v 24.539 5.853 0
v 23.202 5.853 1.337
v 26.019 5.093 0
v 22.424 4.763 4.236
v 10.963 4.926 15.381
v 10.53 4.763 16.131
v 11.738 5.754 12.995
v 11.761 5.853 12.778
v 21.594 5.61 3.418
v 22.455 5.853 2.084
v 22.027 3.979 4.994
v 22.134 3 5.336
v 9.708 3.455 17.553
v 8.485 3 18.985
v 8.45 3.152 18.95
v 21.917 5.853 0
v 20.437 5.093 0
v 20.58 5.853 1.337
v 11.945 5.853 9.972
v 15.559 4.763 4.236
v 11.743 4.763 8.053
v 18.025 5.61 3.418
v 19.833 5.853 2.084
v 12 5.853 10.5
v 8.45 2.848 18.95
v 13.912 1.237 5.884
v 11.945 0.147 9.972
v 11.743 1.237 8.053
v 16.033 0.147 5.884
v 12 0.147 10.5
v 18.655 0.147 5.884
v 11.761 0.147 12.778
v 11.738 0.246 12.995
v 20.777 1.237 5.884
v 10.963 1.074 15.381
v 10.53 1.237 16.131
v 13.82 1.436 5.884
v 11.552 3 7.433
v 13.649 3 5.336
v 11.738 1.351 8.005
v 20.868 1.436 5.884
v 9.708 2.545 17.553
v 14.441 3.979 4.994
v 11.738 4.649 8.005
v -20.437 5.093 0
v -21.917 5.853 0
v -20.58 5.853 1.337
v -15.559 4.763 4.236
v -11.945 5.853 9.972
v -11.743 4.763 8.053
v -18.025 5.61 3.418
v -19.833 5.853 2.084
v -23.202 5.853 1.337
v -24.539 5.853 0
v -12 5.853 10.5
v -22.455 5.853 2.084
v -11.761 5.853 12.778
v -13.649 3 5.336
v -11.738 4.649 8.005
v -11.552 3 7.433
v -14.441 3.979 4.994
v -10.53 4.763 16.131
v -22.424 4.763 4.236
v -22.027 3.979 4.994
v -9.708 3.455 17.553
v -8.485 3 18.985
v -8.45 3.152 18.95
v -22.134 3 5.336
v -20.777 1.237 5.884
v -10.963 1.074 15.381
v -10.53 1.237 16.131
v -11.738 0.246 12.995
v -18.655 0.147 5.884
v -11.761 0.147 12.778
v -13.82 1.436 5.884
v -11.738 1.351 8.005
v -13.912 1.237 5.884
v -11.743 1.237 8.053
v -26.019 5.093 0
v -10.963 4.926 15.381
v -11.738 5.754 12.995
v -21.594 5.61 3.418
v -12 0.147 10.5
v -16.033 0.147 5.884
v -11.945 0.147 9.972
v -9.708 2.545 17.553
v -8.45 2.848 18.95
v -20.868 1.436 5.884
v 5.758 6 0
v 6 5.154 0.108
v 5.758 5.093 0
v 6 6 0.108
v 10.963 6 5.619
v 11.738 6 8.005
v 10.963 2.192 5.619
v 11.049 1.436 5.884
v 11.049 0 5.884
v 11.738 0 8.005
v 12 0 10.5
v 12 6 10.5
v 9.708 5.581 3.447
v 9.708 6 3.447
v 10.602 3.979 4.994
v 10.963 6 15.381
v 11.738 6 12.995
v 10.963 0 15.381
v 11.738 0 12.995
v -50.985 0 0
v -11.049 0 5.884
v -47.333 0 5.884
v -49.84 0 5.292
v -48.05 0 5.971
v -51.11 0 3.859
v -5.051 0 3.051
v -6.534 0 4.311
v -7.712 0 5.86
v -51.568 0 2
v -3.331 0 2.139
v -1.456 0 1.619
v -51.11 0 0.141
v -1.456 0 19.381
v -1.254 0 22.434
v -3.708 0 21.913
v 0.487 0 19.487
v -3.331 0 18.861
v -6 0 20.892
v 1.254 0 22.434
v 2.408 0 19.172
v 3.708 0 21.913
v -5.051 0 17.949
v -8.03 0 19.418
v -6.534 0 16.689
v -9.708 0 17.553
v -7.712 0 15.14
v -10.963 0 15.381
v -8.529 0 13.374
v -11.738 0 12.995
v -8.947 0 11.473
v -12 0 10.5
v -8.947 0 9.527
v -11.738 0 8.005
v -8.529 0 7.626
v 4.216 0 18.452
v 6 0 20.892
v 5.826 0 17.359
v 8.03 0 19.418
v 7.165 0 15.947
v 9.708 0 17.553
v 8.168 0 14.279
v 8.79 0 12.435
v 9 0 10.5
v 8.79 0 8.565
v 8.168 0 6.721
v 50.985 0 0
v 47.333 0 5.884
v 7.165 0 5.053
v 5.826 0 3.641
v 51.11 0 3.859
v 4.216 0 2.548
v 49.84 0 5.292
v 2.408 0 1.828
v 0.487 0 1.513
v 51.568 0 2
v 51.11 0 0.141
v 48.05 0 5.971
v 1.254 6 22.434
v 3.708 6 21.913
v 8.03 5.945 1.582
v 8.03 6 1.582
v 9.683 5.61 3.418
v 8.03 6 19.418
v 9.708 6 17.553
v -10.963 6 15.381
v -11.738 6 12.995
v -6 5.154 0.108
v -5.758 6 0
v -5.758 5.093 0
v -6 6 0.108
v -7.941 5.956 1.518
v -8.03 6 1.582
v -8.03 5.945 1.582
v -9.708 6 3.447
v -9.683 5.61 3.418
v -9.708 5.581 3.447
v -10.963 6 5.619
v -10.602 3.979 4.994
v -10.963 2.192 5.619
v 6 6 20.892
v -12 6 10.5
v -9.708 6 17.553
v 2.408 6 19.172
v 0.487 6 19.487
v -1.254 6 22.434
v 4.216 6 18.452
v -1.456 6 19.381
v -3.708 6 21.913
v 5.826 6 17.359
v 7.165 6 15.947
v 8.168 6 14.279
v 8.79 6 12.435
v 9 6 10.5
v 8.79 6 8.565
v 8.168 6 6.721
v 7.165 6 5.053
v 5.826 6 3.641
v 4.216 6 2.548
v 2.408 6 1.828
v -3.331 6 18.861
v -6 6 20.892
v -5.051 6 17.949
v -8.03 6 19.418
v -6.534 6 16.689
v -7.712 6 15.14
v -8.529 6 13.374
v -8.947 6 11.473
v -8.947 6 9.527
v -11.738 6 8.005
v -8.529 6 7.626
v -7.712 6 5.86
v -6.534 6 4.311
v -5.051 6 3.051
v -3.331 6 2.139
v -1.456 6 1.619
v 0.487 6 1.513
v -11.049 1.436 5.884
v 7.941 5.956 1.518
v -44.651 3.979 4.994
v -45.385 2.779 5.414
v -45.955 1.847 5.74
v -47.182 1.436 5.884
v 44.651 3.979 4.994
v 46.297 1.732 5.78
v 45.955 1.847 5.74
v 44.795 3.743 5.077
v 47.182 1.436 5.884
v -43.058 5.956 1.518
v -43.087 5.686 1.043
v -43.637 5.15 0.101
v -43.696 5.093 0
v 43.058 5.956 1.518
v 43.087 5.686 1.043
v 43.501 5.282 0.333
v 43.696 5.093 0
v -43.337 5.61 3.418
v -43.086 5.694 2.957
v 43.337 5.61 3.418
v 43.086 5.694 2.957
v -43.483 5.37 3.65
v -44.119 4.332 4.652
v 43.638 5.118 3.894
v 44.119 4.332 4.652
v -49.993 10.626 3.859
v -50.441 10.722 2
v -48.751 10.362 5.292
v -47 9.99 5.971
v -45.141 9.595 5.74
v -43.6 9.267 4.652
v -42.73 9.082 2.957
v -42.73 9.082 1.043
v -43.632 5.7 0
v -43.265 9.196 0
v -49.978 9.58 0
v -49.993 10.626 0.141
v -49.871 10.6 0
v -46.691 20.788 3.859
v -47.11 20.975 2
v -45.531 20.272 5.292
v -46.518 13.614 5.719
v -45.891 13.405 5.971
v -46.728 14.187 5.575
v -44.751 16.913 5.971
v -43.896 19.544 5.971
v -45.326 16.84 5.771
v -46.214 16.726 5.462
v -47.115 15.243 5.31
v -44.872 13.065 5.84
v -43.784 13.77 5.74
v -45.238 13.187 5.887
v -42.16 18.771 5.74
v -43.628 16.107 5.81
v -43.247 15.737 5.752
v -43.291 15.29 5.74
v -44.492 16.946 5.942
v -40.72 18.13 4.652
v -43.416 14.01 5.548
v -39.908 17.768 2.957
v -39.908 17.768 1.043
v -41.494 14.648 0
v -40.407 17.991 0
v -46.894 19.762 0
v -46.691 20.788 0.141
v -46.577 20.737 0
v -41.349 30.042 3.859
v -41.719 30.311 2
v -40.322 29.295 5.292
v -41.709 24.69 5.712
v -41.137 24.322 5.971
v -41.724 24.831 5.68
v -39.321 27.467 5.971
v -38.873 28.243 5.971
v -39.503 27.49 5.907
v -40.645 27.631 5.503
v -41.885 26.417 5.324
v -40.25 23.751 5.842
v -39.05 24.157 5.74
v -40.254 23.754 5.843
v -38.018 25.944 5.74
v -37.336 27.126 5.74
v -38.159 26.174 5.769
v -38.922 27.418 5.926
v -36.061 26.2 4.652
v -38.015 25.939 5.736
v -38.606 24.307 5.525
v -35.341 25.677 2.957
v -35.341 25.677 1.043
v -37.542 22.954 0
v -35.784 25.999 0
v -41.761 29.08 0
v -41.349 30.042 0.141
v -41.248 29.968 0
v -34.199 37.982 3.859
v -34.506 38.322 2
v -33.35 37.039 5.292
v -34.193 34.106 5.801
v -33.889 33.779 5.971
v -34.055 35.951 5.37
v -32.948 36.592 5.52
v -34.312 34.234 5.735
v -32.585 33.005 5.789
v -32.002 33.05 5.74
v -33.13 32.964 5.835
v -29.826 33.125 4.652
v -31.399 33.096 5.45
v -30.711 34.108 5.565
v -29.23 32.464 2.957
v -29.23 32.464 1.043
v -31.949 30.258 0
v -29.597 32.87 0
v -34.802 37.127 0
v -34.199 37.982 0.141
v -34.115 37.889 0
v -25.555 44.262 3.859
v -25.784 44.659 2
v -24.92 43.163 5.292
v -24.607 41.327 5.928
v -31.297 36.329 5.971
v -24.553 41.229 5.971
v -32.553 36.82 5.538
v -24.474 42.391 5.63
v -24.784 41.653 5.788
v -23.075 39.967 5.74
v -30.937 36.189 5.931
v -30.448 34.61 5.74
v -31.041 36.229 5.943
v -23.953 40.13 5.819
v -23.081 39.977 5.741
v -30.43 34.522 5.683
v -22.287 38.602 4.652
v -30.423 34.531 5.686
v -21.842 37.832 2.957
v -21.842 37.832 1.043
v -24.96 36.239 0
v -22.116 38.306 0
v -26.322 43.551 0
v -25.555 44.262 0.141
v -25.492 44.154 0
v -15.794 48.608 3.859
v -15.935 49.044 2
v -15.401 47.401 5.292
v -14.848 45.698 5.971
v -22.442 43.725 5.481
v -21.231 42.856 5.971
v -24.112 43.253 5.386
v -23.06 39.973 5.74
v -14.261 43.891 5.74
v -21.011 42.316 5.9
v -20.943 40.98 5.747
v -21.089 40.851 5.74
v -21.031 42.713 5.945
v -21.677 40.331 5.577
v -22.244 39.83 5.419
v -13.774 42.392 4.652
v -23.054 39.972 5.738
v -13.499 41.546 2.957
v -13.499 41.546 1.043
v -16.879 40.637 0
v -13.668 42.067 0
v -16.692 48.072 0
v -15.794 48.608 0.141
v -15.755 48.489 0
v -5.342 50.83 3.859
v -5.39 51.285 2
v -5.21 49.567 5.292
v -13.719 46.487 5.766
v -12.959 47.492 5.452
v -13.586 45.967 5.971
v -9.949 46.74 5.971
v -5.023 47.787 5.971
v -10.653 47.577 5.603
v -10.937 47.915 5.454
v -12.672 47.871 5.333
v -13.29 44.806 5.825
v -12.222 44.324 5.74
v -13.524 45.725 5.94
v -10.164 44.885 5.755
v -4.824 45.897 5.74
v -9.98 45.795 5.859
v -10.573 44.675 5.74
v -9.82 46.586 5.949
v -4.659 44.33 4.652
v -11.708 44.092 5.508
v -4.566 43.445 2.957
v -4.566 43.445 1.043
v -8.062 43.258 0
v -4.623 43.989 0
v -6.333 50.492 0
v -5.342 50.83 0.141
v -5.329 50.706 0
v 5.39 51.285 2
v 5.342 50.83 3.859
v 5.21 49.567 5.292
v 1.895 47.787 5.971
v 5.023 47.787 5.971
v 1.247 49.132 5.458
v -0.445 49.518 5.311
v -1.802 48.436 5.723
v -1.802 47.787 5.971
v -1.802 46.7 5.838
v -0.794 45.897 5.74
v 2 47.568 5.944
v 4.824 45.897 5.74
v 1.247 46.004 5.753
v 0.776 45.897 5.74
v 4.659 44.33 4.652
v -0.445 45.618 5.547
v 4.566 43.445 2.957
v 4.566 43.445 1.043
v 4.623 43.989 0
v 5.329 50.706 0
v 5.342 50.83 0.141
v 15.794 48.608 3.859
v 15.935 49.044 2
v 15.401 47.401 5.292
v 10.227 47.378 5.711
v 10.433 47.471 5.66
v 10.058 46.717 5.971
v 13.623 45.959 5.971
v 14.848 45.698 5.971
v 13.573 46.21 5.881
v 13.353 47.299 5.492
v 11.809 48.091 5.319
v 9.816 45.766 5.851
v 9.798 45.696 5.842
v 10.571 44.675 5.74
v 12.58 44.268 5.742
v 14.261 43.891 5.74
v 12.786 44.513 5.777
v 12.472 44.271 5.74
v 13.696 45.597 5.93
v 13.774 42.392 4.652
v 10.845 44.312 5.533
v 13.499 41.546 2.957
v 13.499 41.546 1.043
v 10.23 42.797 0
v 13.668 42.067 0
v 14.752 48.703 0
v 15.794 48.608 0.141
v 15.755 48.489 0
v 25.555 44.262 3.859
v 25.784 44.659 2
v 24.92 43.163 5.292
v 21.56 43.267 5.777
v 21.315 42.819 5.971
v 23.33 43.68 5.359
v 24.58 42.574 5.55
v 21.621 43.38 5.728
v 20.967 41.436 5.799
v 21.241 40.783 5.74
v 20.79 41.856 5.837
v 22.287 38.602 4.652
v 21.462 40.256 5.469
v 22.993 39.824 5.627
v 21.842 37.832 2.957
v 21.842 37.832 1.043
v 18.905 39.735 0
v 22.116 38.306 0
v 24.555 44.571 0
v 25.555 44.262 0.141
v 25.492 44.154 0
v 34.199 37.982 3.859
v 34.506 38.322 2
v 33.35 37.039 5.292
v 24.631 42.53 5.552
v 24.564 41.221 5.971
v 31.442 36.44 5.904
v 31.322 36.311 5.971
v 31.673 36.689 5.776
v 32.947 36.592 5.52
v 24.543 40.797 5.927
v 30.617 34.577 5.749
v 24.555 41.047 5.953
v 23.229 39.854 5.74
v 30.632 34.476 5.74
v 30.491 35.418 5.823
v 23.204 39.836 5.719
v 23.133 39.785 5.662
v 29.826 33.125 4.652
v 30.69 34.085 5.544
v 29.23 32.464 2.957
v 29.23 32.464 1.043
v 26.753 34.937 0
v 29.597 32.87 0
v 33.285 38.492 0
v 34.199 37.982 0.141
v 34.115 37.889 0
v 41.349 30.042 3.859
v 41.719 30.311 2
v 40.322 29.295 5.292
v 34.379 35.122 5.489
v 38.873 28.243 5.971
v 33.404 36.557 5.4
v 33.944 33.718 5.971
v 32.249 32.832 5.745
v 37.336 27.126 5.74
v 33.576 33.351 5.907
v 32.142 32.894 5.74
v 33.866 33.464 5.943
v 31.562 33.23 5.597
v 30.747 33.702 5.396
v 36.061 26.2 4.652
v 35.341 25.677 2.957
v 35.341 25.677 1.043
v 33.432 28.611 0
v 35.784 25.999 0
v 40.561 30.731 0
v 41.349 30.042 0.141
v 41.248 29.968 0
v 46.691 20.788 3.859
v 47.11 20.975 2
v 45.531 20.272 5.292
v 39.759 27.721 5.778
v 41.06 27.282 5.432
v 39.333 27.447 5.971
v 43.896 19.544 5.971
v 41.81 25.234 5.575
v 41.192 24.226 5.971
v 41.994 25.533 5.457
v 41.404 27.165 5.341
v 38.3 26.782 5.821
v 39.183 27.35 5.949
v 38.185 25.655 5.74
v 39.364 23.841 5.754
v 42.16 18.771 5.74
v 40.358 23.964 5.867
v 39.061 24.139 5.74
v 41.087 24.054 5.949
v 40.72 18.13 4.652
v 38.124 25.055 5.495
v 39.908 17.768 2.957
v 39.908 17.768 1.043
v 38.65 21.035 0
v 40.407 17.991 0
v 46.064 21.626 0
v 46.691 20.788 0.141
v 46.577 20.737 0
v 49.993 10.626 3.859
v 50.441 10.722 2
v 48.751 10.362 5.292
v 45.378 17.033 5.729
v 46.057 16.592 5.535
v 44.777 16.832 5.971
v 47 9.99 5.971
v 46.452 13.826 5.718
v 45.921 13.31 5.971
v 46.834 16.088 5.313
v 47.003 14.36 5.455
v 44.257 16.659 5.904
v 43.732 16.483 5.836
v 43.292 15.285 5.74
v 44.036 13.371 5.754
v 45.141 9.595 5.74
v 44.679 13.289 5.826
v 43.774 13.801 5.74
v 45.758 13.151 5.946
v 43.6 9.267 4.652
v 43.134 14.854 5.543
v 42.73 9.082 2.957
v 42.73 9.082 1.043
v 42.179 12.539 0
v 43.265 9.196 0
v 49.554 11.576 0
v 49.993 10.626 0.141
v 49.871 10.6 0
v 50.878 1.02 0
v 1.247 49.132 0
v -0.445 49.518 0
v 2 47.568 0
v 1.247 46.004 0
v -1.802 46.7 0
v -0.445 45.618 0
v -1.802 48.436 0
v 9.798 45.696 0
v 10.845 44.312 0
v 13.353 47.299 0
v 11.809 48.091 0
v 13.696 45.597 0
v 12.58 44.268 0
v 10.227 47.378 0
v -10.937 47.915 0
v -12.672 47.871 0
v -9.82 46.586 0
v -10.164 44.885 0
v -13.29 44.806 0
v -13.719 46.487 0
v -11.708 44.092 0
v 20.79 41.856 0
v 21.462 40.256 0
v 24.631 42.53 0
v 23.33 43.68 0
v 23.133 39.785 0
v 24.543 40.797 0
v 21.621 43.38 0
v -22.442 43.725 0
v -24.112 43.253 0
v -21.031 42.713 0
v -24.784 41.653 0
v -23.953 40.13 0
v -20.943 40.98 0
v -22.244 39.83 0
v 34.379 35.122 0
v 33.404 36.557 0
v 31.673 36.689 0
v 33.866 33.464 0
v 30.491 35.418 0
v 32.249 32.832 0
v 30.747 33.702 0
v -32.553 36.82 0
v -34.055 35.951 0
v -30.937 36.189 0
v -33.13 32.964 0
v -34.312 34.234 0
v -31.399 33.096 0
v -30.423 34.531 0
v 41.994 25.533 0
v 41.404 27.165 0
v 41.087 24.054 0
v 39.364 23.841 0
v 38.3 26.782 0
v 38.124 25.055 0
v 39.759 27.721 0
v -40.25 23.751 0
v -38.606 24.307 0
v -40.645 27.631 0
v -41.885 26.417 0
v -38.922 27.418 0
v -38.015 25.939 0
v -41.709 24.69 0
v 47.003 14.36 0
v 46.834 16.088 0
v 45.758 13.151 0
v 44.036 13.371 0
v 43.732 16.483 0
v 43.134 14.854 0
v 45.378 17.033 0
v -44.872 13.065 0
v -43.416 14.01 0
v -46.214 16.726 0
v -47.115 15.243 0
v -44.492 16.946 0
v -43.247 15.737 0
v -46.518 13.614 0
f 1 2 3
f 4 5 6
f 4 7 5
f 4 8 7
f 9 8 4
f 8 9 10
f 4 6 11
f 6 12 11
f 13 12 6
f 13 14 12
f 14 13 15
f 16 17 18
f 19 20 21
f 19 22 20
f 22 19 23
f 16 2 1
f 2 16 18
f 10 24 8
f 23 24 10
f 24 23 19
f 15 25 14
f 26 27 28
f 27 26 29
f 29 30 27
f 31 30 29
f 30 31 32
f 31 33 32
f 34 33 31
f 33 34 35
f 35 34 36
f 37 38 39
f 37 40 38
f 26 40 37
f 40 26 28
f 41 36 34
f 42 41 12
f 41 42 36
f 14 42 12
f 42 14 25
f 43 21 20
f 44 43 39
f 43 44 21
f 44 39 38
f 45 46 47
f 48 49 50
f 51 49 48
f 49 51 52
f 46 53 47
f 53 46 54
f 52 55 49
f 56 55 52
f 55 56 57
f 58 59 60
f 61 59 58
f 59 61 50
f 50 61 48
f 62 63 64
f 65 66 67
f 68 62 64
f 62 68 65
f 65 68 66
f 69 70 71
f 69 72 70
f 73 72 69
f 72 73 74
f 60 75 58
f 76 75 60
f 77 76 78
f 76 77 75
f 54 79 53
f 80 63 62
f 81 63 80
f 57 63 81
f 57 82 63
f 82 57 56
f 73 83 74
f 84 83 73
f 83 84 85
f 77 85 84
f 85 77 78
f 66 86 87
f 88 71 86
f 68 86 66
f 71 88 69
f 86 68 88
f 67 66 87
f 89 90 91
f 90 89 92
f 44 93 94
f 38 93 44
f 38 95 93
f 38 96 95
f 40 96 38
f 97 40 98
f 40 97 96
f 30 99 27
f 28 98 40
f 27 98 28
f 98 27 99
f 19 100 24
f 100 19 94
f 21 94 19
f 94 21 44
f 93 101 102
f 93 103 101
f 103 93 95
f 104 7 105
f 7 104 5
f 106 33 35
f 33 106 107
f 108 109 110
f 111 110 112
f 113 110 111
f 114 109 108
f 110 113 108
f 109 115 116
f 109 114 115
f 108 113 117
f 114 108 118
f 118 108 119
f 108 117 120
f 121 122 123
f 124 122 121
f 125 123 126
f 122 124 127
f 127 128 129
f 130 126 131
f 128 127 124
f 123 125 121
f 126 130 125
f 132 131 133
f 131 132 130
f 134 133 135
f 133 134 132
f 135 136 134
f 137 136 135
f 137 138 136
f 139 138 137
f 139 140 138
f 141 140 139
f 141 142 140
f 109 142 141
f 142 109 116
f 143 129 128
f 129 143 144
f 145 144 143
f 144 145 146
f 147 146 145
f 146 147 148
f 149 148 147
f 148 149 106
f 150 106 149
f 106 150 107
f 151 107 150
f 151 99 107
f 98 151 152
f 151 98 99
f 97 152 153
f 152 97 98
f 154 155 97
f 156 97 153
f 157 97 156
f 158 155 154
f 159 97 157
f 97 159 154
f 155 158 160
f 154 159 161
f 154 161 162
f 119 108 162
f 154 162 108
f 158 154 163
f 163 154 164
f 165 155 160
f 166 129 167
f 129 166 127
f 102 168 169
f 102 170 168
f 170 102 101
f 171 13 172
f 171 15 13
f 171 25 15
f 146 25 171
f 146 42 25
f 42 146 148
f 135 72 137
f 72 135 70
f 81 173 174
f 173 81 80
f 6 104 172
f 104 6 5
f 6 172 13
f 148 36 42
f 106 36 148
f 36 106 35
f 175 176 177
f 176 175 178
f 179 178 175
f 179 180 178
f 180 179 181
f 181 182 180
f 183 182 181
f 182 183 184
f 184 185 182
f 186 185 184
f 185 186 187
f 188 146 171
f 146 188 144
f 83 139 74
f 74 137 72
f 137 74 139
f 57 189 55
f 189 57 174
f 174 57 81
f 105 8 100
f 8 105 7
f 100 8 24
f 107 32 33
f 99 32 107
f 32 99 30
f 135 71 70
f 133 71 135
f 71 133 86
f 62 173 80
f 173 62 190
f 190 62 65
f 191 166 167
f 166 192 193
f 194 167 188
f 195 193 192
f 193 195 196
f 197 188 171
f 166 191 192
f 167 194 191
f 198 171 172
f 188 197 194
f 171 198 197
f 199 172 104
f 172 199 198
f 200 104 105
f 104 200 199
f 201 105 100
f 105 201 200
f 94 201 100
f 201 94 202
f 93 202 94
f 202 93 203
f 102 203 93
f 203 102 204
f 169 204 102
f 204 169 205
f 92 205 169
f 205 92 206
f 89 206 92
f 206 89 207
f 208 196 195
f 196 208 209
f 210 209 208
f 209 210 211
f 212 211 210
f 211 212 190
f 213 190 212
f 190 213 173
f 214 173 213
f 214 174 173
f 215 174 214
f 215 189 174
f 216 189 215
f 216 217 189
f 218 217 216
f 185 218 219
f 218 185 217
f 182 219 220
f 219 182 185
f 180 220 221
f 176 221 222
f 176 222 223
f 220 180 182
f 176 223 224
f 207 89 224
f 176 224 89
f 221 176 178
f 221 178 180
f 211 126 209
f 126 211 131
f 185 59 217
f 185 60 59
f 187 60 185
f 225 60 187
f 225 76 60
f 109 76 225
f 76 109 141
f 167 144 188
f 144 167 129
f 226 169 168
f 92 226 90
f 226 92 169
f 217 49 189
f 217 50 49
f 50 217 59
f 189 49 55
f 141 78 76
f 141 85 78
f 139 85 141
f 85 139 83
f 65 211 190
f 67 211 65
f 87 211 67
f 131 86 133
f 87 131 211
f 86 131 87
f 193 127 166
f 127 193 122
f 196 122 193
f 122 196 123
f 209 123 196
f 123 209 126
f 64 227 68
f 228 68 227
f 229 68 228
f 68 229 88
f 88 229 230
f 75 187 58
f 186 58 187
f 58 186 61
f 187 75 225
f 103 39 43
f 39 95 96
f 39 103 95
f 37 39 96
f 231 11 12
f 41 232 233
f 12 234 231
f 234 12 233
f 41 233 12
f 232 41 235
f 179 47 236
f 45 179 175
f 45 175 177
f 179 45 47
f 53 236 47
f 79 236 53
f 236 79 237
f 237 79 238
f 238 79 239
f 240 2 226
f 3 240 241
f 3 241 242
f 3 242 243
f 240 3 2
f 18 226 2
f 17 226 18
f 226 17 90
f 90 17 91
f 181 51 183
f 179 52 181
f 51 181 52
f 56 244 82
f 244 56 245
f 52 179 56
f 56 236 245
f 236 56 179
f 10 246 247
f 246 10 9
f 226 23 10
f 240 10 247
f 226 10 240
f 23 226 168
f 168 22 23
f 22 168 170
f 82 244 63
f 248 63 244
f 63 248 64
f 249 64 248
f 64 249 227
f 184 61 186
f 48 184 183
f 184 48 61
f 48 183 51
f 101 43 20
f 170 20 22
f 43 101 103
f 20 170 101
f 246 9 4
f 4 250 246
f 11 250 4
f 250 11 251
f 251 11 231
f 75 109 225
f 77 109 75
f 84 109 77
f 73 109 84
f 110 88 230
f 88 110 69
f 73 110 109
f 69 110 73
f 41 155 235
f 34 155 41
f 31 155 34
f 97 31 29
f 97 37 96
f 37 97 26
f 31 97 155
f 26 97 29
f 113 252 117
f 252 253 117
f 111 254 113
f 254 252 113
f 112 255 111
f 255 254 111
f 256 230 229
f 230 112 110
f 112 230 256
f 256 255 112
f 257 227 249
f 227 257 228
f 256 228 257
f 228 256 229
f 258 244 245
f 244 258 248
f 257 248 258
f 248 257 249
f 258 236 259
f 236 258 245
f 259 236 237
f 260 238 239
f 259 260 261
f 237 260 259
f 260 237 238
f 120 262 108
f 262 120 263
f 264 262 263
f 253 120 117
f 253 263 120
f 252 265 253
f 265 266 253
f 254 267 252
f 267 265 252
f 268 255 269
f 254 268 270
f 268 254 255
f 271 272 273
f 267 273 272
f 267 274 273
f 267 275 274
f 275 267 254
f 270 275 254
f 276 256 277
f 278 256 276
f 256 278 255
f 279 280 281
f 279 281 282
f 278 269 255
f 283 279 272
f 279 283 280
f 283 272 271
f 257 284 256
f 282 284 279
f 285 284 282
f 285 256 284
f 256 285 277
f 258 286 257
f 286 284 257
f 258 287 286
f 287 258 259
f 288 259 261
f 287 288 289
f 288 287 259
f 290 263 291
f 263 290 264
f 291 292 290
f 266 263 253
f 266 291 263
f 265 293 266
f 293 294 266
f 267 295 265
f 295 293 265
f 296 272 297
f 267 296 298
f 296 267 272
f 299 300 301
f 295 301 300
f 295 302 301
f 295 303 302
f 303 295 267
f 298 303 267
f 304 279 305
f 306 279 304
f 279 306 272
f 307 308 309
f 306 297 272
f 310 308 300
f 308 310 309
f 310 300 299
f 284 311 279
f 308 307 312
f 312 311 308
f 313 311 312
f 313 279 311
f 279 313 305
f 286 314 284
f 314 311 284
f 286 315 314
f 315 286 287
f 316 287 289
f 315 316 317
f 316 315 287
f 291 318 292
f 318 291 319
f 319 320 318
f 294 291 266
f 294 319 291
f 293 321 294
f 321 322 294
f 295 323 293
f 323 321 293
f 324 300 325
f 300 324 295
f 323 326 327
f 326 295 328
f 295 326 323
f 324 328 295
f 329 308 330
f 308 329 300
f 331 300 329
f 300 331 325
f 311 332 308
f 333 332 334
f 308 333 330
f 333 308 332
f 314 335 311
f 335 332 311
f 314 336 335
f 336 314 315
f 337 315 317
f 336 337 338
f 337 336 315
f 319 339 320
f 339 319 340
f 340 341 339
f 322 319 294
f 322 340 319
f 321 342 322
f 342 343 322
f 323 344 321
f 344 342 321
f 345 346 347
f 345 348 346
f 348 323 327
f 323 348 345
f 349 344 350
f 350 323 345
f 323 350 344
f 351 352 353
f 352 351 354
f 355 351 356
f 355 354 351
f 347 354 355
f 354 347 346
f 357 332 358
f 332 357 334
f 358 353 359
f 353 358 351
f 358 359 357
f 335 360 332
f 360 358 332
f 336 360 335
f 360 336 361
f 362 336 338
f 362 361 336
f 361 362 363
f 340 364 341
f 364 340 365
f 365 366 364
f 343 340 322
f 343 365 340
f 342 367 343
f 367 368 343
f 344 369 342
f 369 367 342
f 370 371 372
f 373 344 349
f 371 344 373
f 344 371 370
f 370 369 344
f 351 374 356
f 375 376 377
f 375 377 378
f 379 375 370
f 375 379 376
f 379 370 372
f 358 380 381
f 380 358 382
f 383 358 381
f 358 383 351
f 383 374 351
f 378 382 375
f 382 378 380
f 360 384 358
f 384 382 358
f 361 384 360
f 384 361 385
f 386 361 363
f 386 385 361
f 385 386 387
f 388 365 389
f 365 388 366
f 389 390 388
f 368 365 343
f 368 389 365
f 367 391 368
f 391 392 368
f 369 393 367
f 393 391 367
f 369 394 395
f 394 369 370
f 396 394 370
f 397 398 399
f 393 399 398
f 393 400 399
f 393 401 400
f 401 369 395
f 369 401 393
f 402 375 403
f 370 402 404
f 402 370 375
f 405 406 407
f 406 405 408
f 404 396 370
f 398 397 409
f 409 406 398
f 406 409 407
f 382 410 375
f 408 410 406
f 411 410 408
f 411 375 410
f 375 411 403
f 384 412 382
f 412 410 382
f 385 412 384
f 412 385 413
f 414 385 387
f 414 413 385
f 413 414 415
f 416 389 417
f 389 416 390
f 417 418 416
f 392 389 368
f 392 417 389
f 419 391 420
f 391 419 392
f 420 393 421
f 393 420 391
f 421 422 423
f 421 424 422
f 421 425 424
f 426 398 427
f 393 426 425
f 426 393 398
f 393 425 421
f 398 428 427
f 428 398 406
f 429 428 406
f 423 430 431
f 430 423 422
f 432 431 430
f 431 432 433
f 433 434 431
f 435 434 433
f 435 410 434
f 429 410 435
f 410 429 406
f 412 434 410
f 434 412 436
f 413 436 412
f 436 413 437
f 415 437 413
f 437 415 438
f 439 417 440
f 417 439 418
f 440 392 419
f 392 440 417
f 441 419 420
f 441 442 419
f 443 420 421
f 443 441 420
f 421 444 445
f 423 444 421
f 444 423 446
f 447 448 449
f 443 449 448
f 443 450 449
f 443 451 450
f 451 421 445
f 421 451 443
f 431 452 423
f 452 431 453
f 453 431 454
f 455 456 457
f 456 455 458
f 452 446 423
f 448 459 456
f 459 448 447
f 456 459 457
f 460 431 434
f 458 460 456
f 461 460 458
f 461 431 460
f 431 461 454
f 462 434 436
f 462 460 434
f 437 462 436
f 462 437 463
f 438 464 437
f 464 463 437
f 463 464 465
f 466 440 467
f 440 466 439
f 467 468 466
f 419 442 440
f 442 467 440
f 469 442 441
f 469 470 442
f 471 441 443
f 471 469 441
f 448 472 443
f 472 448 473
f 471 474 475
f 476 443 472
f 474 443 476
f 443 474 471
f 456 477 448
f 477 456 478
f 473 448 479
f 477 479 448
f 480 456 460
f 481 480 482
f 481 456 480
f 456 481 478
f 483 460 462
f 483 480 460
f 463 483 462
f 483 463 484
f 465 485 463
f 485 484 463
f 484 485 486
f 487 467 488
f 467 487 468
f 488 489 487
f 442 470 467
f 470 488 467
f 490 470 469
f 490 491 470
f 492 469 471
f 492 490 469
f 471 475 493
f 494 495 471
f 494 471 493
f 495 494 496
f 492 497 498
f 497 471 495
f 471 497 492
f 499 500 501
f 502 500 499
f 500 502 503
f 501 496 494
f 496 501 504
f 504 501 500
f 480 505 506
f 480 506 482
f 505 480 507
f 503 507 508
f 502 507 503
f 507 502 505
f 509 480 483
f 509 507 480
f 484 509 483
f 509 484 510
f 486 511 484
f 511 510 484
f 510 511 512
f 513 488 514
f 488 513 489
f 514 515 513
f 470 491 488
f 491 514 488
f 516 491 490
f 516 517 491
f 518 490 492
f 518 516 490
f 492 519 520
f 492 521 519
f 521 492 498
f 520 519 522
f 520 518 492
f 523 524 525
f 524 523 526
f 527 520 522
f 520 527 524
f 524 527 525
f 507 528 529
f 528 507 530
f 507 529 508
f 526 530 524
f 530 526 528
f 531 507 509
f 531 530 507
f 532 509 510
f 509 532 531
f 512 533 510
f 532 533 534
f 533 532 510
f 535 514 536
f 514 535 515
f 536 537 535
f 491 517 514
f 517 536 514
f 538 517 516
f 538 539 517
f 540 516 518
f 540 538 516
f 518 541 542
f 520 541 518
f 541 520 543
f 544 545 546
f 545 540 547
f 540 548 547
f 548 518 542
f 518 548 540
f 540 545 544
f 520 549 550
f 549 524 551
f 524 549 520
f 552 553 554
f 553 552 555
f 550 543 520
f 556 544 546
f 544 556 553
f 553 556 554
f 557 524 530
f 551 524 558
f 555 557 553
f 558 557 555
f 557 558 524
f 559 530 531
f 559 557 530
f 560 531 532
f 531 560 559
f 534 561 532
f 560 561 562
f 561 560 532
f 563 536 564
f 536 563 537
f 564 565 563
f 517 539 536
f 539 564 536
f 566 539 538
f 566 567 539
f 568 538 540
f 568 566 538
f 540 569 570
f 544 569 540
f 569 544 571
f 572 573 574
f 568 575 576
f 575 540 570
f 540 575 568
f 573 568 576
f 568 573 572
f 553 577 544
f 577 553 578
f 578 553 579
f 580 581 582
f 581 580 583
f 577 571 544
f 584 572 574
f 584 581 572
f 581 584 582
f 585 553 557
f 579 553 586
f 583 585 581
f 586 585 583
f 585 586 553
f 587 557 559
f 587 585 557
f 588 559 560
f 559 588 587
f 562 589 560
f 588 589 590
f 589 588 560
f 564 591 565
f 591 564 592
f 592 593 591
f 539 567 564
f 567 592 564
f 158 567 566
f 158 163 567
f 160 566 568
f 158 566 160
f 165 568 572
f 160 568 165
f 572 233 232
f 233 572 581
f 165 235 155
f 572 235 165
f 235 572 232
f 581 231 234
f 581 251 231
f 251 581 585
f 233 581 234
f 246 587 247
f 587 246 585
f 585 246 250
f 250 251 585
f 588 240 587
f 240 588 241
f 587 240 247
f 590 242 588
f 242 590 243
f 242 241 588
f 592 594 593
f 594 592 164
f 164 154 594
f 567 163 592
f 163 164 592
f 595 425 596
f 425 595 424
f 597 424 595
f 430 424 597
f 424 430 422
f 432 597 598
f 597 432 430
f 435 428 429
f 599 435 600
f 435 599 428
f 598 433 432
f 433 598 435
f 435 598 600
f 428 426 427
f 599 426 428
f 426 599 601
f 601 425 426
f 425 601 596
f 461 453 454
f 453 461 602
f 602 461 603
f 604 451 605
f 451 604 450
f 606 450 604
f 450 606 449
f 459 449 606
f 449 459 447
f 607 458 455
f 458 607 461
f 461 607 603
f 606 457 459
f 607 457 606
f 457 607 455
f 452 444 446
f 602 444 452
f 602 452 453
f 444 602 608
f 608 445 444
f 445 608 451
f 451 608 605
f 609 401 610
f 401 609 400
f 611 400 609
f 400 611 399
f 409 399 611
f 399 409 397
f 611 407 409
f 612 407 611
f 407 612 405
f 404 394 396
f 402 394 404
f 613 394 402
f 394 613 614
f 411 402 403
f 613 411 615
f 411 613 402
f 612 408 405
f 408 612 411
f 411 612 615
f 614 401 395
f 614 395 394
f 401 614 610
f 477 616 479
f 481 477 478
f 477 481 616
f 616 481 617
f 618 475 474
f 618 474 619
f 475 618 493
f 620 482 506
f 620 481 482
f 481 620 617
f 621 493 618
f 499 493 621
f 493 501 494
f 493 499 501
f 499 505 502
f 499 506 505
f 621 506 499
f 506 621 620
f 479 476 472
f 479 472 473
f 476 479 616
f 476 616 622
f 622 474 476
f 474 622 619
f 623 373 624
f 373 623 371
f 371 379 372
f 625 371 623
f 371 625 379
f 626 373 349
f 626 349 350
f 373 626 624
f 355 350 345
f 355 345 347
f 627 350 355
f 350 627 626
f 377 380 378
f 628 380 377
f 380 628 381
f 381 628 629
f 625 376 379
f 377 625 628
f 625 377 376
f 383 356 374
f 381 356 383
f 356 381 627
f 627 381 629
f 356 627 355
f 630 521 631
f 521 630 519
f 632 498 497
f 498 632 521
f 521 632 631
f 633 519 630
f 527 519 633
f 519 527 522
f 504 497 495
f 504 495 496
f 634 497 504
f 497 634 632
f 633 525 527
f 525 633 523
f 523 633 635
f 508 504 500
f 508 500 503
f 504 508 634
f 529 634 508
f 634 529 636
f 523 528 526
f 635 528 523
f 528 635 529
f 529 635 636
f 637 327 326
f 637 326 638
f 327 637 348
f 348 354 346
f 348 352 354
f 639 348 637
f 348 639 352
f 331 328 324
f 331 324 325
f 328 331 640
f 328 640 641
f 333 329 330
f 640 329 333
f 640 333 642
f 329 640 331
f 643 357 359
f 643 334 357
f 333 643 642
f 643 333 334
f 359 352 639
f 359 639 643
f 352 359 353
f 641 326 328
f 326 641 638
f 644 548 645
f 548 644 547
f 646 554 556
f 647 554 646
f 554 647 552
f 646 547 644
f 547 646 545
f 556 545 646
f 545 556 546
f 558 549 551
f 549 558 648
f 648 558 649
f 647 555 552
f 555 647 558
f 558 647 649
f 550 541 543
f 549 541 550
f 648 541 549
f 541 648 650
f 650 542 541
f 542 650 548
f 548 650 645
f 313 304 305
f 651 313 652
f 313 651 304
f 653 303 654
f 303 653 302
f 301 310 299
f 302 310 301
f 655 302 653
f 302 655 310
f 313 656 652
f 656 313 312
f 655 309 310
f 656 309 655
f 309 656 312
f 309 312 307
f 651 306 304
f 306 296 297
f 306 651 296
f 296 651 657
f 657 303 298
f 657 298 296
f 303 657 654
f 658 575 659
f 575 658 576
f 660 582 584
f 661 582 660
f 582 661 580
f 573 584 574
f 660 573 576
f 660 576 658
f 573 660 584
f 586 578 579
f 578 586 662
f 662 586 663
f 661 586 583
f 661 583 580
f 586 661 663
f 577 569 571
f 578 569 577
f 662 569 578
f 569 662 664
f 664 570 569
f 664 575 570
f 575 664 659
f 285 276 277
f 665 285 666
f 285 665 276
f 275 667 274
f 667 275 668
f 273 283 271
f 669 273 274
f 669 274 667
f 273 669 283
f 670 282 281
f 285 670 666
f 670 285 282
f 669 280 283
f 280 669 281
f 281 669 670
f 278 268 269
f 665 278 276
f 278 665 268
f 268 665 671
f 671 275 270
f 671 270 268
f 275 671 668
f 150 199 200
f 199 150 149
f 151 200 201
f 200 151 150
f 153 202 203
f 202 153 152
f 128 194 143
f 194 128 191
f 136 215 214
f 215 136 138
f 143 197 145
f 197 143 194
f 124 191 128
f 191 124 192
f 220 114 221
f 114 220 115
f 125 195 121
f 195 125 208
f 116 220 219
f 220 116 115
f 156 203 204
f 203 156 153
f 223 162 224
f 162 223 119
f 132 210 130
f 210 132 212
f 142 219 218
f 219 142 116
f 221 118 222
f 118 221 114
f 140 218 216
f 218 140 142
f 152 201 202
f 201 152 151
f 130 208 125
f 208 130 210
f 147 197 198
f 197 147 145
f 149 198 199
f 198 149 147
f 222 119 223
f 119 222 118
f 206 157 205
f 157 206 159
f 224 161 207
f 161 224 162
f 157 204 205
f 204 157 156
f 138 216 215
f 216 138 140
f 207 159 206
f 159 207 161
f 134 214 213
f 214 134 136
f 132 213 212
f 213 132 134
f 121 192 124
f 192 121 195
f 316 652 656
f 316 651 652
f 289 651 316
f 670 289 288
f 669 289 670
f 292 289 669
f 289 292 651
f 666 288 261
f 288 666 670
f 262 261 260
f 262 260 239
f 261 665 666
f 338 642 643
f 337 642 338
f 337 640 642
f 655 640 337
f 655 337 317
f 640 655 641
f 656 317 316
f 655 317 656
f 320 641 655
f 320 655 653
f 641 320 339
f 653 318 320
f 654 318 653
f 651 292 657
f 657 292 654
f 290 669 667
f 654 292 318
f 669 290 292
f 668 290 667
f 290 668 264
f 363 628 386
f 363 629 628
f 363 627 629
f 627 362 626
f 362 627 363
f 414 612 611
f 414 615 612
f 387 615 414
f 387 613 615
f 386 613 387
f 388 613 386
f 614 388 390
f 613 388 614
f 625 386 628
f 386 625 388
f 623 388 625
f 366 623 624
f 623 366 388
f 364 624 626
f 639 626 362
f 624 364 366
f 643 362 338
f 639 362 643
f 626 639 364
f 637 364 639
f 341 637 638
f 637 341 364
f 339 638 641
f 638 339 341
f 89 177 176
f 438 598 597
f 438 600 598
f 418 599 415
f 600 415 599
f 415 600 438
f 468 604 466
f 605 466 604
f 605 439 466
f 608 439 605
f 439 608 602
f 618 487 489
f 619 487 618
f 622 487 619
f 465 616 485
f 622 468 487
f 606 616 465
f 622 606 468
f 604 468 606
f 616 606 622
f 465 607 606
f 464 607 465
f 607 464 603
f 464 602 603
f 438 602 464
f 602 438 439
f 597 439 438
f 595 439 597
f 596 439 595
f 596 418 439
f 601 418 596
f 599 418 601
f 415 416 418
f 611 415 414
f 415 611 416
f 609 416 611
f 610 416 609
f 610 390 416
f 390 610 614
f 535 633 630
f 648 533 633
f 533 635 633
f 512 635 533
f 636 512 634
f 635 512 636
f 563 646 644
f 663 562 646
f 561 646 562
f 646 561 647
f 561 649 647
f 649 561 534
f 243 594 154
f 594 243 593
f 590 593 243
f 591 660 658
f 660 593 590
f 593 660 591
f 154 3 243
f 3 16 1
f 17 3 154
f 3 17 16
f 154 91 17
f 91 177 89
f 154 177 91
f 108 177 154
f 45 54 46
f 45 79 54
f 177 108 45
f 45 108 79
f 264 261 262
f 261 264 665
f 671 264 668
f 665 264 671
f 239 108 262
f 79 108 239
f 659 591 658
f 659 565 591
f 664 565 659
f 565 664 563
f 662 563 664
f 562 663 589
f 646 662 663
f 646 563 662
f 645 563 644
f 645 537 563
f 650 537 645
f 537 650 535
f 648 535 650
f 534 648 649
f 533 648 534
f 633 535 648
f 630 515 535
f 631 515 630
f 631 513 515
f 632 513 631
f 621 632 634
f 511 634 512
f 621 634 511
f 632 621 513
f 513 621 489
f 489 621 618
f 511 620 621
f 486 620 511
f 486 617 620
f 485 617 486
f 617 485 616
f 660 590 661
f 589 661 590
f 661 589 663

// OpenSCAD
// file: ../lib/rounded_box.scad
//
//  Copyright (C) 01-04-2012 Jasper den Ouden.
//
//  This is free software: you can redistribute it and/or modify
//  it under the terms of the GNU General Public License as published
//  by the Free Software Foundation, either version 3 of the License, or
//  (at your option) any later version.
//

module sph_cyl(r,h, x,y)
{ sphere(r);
  cylinder(r=r,h= h-2*r);
  translate([0,0,h-2*r]) sphere(r);
  if(x > 0)
  { rotate(v=[0,1,0],a=90) cylinder(r=r,h=x);
    translate([0,0,h-2*r]) rotate(v=[0,1,0],a=90) cylinder(r=r,h=x);
  } else {
    rotate(v=[0,1,0],a=-90) cylinder(r=r,h=-x);
    translate([0,0,h-2*r]) rotate(v=[0,1,0],a=-90) cylinder(r=r,h=-x);
  }
  if(y > 0)
  { rotate(v=[1,0,0],a=90) cylinder(r=r,h=y);
    translate([0,0,h-2*r]) rotate(v=[1,0,0],a=90) cylinder(r=r,h=y);
  } else {
    rotate(v=[1,0,0],a=-90) cylinder(r=r,h=-y);
    translate([0,0,h-2*r]) rotate(v=[1,0,0],a=-90) cylinder(r=r,h=-y);
  }
}

module rounded_square(w,l,r)
{
    r = (2*r> w ? w/2 : r);
    translate([r,0]) square([w-2*r, l]);
    translate([0,r]) square([w, l-2*r]);
    
    translate([r,   r])   circle(r);
    translate([w-r, r])   circle(r);
    translate([r,   l-r]) circle(r);
    translate([w-r, l-r]) circle(r);
}


//If only minkowski was fast.
module rounded_cube(w,l,h,r)
{
    translate([r,r]) cube([w-2*r,l-2*r,h]);
    translate([0,r,r]) cube([w,l-2*r,h-2*r]);
    translate([r,0,r]) cube([w-2*r,l,h-2*r]);

    translate([r,r,r]) sph_cyl(r,h, w-2*r,0);
    translate([r,l-r,r]) sph_cyl(r,h, w-2*r,l-2*r);
    translate([w-r,r,r]) sph_cyl(r,h, 0,-l+2*r);
    translate([w-r,l-r,r]) sph_cyl(r,h, 0,0);
}

//rounded_box(40,40,80,10);
// main file
//
//  Copyright (C) 11-04-2012 Jasper den Ouden.
//
//  This is free software: you can redistribute it and/or modify
//  it under the terms of the GNU General Public License as published
//  by the Free Software Foundation, either version 3 of the License, or
//  (at your option) any later version.
//

//Note: only really suitable for mh<t;

use<../lib/rounded_box.scad>

cl= 260; //circumference.

pi=3.141592653589793;
r= cl/(2+pi);

echo(2*r);

fd = 25; //Distance between 'feature-adding holes'
fr = 2;

t= 6;   //Thickness of walls.

mr = 9;   //Radius of embedded magnets.(Get it right!)
mh = t; //.. height

h = max(2*mr+t/2, 2*t); //Calculated height

inf=2*(h+r);

skimmer=true;

module magnet_hole()
{   rotate([90,0]) translate([0,h/2,-mh]) cylinder(r=mr,h=2*mh); }

module feature_hole()
{
    translate([0,r-t/2]) cylinder(r=fr, h=3*h);
//    translate([0,r-2*t,h+1.2*t]) rotate([-90,0]) 
//        scale([1/8,h/(4*fd)]) cylinder(r=fd, h=3*h);
}

module bag_holder()
{

//2*r^2 *(1-cos(da)) = fd^2
// 1-cos(da) = (fd/r)^2/2
    da = acos(1-fd*fd/(2*r*r));
    intersection()
    {   difference()
        {   translate([0,0,t/3]) union()
            {   rotate([-90,0]) translate([0,t/3-h/2]) cylinder(r=mr+t/2,h=t);
                translate([0,t/2,h/2-t/3])
                {   rotate([0,-45]) translate([mr,0,-sqrt(2)*h]) 
                        cylinder(r=t/2,h=sqrt(2)*h);
                    rotate([0,225]) translate([mr,0]) 
                        cylinder(r=t/2,h=sqrt(2)*h);
                }
                translate([t/2-r,0]) rotate([0,90])  
                    scale([1,3/2]) cylinder(r=2*t/3,h=2*r-t);
                rotate_extrude() translate([r-t/2,0]) circle(2*t/3);
            }
            magnet_hole();
            if( fr>0 ) translate([0,0,-h]) for( a=[0 : da/2 : 80] )
            {   rotate(-a) feature_hole();
                rotate(+a) feature_hole();
            }
        }
        translate([0,inf,inf]) cube(2*[inf,inf,inf], center=true);
    }
}

bag_holder();
